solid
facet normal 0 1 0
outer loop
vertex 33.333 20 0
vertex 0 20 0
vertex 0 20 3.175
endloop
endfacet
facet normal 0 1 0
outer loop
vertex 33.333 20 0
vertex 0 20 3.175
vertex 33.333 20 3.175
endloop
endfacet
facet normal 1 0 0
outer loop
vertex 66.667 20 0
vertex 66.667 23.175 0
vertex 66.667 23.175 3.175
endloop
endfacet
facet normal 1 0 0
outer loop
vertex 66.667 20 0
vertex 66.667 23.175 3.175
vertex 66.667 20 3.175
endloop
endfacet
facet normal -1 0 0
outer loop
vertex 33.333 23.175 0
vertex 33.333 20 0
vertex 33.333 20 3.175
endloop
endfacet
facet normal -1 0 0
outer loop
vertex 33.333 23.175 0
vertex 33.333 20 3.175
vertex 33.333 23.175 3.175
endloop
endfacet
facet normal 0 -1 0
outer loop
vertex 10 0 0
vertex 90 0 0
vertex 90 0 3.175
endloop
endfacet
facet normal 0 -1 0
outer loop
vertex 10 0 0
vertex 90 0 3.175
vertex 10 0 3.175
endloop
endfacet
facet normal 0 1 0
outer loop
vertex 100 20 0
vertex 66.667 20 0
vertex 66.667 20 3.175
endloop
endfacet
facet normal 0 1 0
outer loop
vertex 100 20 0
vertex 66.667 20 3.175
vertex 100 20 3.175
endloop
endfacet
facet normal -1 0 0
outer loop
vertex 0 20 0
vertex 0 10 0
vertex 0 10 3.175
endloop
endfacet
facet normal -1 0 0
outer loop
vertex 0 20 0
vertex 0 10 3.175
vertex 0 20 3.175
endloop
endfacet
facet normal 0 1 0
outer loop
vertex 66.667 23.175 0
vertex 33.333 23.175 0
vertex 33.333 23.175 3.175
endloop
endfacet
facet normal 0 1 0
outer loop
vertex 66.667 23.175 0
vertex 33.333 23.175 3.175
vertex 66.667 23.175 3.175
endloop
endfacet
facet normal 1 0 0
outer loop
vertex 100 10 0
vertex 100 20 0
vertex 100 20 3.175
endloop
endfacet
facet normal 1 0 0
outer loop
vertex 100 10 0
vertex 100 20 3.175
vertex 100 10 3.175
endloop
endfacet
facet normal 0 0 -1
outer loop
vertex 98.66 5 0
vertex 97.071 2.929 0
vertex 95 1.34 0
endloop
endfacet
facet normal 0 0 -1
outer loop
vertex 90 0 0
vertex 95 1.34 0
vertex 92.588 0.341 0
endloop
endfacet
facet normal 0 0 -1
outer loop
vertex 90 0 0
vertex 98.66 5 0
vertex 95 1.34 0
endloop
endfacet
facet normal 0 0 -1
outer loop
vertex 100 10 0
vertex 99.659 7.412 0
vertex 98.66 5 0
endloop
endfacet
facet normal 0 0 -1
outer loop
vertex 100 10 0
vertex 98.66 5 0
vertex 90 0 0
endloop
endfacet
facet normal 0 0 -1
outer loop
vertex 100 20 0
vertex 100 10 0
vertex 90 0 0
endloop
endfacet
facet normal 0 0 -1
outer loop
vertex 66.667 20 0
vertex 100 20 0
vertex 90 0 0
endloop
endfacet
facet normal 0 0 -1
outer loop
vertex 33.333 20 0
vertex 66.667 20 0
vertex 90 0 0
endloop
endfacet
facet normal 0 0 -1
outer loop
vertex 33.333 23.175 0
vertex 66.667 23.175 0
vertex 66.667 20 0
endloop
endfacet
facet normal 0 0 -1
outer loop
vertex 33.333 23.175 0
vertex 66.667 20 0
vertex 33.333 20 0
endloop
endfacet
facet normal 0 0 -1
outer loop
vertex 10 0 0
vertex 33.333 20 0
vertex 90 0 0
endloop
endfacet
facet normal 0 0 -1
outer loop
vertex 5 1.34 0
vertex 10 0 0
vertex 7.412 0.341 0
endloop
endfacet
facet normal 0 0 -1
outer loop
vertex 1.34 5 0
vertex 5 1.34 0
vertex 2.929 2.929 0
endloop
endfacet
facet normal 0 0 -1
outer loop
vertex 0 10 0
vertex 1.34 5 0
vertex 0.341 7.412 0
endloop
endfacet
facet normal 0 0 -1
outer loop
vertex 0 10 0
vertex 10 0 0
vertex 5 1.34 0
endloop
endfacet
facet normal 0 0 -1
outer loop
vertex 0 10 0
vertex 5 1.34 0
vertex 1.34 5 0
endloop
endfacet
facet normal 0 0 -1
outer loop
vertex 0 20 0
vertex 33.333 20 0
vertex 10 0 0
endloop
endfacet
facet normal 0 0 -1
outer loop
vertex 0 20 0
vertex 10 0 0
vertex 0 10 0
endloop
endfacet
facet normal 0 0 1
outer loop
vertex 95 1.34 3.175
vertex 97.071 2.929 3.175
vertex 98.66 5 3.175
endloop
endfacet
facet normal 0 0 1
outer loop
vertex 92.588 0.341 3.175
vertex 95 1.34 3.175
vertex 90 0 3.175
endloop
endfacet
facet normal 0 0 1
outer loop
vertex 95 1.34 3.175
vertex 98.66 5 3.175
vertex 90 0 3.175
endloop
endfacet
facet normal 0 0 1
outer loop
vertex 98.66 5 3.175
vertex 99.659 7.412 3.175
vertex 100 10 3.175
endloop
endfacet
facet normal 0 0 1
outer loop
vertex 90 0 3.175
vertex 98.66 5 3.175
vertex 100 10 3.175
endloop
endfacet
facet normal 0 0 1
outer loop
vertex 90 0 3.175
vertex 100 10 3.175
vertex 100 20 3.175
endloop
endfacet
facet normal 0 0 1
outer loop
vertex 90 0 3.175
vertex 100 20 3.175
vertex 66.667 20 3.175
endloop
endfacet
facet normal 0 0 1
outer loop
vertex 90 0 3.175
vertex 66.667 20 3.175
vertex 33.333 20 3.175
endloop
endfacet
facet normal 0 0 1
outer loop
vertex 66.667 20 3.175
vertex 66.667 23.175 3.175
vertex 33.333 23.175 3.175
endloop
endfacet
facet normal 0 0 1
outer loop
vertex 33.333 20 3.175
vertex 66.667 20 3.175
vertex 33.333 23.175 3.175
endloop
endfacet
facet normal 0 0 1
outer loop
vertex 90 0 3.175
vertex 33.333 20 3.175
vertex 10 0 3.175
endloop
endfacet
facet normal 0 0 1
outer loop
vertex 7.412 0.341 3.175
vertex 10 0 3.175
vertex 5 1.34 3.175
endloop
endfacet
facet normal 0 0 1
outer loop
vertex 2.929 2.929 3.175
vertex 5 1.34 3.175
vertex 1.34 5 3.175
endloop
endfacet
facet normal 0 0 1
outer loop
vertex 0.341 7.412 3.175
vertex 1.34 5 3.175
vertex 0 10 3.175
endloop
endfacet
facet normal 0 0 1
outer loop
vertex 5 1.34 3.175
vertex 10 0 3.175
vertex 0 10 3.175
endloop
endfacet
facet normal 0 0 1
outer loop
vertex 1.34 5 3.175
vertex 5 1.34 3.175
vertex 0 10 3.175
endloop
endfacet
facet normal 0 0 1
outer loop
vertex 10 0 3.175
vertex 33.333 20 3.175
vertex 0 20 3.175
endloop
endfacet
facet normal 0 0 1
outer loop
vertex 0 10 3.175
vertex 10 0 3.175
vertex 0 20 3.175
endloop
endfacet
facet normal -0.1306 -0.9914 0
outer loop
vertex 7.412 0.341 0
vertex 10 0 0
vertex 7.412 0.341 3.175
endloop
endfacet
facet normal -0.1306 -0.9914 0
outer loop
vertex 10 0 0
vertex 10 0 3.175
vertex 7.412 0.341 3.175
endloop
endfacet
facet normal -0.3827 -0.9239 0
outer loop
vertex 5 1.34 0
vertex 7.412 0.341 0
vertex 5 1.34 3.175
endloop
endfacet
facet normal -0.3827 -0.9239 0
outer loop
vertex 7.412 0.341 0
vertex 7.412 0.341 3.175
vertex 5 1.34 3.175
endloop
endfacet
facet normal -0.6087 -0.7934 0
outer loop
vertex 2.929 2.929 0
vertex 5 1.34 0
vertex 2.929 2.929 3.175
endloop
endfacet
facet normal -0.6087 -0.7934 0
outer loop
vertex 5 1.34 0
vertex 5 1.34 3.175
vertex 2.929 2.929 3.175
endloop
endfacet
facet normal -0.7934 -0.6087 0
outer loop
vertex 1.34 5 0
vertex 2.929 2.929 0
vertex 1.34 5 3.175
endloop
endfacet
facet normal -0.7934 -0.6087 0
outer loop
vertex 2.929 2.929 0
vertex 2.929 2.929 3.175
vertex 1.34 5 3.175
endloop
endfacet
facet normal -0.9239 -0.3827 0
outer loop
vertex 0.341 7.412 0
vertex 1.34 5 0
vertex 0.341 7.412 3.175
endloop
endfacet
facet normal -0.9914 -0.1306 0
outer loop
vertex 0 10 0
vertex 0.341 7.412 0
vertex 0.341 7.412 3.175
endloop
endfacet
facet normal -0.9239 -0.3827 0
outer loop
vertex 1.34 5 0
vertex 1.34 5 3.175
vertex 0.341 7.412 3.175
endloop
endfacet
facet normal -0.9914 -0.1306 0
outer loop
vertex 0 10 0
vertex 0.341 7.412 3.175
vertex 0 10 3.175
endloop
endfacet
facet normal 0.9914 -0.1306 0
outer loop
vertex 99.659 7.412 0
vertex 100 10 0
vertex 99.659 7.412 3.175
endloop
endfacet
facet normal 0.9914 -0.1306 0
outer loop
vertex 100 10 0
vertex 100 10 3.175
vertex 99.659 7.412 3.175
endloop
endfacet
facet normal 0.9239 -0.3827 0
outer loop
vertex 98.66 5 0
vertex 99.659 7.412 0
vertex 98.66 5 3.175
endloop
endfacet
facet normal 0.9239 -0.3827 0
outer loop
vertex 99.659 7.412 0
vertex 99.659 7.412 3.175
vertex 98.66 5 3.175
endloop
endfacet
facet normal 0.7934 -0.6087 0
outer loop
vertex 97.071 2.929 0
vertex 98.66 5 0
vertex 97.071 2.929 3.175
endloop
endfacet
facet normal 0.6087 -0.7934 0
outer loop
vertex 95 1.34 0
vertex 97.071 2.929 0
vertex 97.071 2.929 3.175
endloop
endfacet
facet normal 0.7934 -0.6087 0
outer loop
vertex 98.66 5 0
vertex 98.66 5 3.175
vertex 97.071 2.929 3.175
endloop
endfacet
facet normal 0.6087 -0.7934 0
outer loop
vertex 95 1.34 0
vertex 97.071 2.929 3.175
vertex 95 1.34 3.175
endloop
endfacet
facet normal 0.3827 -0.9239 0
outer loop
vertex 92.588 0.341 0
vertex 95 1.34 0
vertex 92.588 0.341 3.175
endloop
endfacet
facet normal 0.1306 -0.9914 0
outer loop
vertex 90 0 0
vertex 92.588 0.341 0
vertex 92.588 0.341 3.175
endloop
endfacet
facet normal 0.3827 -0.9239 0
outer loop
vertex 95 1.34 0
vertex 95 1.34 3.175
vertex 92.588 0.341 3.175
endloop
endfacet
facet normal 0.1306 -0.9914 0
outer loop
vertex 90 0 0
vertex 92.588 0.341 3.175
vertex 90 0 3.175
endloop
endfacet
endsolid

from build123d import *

# Parameters (mm, degrees)
BOSS_EXTRUDE1_DEPTH = 3.175
FILLET1_R           = 10


with BuildPart() as part:
    # Sketch1 → Boss-Extrude1 (new body)
    with BuildSketch(Plane.XY):
        Polygon((0, 20), (33.333333333, 20), (33.333333333, 23.175), (66.666666667, 23.175), (66.666666667, 20), (100, 20), (100, 0), (0, 0), align=None)
    extrude(amount=BOSS_EXTRUDE1_DEPTH)

    # Fillet1
    fillet1_edges = [part.edges().sort_by_distance(p)[0] for p in [
        (100, 0, 1.5875),
        (0, 0, 1.5875),
    ]]
    fillet(fillet1_edges, radius=FILLET1_R)


solid = part.part
